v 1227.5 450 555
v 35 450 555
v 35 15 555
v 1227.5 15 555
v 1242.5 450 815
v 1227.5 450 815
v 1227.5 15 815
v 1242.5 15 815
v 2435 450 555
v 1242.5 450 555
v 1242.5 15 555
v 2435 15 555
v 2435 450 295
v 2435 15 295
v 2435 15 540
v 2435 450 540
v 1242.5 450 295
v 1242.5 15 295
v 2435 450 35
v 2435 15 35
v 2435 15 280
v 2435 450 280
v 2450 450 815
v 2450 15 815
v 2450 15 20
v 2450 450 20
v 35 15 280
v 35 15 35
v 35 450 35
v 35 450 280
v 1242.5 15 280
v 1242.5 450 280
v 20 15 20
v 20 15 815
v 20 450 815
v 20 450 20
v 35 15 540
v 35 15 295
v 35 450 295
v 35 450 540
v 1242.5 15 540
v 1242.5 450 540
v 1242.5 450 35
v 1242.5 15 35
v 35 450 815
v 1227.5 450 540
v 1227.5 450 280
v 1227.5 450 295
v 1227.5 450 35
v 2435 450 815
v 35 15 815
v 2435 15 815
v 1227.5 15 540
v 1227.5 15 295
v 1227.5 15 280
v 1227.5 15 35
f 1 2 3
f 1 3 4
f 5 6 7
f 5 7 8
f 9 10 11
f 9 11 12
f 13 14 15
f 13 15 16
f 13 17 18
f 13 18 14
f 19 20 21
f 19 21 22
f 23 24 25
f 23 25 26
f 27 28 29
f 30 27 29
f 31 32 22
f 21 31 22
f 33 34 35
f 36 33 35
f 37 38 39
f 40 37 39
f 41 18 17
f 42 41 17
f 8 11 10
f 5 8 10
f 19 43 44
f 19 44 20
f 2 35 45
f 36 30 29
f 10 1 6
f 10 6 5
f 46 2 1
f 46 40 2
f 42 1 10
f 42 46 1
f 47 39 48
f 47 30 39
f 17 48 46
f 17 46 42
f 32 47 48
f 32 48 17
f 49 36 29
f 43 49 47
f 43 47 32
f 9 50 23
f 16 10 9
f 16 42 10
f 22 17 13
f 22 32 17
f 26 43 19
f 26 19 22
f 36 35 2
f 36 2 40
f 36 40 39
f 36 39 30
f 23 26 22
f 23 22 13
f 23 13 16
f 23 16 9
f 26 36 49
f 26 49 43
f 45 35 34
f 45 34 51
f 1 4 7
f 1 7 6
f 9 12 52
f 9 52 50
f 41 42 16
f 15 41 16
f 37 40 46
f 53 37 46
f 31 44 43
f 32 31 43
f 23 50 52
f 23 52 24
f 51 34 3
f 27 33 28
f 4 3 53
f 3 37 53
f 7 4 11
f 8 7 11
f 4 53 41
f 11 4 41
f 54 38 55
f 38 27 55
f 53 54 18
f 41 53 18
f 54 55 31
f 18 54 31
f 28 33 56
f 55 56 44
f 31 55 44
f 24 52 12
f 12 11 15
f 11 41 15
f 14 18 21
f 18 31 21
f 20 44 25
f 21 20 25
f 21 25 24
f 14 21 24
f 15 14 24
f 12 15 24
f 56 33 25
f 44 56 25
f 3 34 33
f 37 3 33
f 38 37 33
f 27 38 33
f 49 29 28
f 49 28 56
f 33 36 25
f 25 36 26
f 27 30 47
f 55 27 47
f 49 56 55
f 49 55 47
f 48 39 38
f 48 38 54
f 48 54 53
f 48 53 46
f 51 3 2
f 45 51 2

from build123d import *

# Parameters (mm, degrees)
SKETCH004_W      = 15
SKETCH004_H      = 435
EXTRUDE004_DEPTH = 780
ARRAY_X_COUNT    = 3
ARRAY_X_PITCH    = 1207.5
SKETCH003_W      = 2430
SKETCH003_H      = 435
EXTRUDE003_DEPTH = 15
ARRAY002_Z_COUNT = 3
ARRAY002_Z_PITCH = 260


with BuildPart() as divis_rias_internas:
    # Sketch004 → Extrude004 (new body)
    with BuildSketch(Plane.XY):
        with Locations((7.5, 217.5)):
            Rectangle(SKETCH004_W, SKETCH004_H)
    extrude(amount=EXTRUDE004_DEPTH)

    # Array X: Divisórias internas ×3


with BuildPart() as divis_rias_internas_1:
    add(divis_rias_internas.part)
    with Locations(*[(i * ARRAY_X_PITCH, 0, 0) for i in range(1, ARRAY_X_COUNT)]):
        add(divis_rias_internas.part)


with BuildPart() as divis_rias_internas_2:
    # Array placement: moved
    add(divis_rias_internas_1.part.moved(Location((20, 15, 35))))


with BuildPart() as divis_o_interna:
    # Sketch003 → Extrude003 (new body)
    with BuildSketch(Plane.XY):
        with Locations((1215, 217.5)):
            Rectangle(SKETCH003_W, SKETCH003_H)
    extrude(amount=EXTRUDE003_DEPTH)


with BuildPart() as divis_o_interna_1:
    # Extrude003 placement: moved
    add(divis_o_interna.part.moved(Location((20, 15, 20))))

    # Array002 Z: Divisão interna ×3


with BuildPart() as divis_o_interna_2:
    add(divis_o_interna_1.part)
    with Locations(*[(0, 0, i * ARRAY002_Z_PITCH) for i in range(1, ARRAY002_Z_COUNT)]):
        add(divis_o_interna_1.part)

    # Fusion001: union Divisórias internas
    add(divis_rias_internas_2.part)


solid = divis_o_interna_2.part
